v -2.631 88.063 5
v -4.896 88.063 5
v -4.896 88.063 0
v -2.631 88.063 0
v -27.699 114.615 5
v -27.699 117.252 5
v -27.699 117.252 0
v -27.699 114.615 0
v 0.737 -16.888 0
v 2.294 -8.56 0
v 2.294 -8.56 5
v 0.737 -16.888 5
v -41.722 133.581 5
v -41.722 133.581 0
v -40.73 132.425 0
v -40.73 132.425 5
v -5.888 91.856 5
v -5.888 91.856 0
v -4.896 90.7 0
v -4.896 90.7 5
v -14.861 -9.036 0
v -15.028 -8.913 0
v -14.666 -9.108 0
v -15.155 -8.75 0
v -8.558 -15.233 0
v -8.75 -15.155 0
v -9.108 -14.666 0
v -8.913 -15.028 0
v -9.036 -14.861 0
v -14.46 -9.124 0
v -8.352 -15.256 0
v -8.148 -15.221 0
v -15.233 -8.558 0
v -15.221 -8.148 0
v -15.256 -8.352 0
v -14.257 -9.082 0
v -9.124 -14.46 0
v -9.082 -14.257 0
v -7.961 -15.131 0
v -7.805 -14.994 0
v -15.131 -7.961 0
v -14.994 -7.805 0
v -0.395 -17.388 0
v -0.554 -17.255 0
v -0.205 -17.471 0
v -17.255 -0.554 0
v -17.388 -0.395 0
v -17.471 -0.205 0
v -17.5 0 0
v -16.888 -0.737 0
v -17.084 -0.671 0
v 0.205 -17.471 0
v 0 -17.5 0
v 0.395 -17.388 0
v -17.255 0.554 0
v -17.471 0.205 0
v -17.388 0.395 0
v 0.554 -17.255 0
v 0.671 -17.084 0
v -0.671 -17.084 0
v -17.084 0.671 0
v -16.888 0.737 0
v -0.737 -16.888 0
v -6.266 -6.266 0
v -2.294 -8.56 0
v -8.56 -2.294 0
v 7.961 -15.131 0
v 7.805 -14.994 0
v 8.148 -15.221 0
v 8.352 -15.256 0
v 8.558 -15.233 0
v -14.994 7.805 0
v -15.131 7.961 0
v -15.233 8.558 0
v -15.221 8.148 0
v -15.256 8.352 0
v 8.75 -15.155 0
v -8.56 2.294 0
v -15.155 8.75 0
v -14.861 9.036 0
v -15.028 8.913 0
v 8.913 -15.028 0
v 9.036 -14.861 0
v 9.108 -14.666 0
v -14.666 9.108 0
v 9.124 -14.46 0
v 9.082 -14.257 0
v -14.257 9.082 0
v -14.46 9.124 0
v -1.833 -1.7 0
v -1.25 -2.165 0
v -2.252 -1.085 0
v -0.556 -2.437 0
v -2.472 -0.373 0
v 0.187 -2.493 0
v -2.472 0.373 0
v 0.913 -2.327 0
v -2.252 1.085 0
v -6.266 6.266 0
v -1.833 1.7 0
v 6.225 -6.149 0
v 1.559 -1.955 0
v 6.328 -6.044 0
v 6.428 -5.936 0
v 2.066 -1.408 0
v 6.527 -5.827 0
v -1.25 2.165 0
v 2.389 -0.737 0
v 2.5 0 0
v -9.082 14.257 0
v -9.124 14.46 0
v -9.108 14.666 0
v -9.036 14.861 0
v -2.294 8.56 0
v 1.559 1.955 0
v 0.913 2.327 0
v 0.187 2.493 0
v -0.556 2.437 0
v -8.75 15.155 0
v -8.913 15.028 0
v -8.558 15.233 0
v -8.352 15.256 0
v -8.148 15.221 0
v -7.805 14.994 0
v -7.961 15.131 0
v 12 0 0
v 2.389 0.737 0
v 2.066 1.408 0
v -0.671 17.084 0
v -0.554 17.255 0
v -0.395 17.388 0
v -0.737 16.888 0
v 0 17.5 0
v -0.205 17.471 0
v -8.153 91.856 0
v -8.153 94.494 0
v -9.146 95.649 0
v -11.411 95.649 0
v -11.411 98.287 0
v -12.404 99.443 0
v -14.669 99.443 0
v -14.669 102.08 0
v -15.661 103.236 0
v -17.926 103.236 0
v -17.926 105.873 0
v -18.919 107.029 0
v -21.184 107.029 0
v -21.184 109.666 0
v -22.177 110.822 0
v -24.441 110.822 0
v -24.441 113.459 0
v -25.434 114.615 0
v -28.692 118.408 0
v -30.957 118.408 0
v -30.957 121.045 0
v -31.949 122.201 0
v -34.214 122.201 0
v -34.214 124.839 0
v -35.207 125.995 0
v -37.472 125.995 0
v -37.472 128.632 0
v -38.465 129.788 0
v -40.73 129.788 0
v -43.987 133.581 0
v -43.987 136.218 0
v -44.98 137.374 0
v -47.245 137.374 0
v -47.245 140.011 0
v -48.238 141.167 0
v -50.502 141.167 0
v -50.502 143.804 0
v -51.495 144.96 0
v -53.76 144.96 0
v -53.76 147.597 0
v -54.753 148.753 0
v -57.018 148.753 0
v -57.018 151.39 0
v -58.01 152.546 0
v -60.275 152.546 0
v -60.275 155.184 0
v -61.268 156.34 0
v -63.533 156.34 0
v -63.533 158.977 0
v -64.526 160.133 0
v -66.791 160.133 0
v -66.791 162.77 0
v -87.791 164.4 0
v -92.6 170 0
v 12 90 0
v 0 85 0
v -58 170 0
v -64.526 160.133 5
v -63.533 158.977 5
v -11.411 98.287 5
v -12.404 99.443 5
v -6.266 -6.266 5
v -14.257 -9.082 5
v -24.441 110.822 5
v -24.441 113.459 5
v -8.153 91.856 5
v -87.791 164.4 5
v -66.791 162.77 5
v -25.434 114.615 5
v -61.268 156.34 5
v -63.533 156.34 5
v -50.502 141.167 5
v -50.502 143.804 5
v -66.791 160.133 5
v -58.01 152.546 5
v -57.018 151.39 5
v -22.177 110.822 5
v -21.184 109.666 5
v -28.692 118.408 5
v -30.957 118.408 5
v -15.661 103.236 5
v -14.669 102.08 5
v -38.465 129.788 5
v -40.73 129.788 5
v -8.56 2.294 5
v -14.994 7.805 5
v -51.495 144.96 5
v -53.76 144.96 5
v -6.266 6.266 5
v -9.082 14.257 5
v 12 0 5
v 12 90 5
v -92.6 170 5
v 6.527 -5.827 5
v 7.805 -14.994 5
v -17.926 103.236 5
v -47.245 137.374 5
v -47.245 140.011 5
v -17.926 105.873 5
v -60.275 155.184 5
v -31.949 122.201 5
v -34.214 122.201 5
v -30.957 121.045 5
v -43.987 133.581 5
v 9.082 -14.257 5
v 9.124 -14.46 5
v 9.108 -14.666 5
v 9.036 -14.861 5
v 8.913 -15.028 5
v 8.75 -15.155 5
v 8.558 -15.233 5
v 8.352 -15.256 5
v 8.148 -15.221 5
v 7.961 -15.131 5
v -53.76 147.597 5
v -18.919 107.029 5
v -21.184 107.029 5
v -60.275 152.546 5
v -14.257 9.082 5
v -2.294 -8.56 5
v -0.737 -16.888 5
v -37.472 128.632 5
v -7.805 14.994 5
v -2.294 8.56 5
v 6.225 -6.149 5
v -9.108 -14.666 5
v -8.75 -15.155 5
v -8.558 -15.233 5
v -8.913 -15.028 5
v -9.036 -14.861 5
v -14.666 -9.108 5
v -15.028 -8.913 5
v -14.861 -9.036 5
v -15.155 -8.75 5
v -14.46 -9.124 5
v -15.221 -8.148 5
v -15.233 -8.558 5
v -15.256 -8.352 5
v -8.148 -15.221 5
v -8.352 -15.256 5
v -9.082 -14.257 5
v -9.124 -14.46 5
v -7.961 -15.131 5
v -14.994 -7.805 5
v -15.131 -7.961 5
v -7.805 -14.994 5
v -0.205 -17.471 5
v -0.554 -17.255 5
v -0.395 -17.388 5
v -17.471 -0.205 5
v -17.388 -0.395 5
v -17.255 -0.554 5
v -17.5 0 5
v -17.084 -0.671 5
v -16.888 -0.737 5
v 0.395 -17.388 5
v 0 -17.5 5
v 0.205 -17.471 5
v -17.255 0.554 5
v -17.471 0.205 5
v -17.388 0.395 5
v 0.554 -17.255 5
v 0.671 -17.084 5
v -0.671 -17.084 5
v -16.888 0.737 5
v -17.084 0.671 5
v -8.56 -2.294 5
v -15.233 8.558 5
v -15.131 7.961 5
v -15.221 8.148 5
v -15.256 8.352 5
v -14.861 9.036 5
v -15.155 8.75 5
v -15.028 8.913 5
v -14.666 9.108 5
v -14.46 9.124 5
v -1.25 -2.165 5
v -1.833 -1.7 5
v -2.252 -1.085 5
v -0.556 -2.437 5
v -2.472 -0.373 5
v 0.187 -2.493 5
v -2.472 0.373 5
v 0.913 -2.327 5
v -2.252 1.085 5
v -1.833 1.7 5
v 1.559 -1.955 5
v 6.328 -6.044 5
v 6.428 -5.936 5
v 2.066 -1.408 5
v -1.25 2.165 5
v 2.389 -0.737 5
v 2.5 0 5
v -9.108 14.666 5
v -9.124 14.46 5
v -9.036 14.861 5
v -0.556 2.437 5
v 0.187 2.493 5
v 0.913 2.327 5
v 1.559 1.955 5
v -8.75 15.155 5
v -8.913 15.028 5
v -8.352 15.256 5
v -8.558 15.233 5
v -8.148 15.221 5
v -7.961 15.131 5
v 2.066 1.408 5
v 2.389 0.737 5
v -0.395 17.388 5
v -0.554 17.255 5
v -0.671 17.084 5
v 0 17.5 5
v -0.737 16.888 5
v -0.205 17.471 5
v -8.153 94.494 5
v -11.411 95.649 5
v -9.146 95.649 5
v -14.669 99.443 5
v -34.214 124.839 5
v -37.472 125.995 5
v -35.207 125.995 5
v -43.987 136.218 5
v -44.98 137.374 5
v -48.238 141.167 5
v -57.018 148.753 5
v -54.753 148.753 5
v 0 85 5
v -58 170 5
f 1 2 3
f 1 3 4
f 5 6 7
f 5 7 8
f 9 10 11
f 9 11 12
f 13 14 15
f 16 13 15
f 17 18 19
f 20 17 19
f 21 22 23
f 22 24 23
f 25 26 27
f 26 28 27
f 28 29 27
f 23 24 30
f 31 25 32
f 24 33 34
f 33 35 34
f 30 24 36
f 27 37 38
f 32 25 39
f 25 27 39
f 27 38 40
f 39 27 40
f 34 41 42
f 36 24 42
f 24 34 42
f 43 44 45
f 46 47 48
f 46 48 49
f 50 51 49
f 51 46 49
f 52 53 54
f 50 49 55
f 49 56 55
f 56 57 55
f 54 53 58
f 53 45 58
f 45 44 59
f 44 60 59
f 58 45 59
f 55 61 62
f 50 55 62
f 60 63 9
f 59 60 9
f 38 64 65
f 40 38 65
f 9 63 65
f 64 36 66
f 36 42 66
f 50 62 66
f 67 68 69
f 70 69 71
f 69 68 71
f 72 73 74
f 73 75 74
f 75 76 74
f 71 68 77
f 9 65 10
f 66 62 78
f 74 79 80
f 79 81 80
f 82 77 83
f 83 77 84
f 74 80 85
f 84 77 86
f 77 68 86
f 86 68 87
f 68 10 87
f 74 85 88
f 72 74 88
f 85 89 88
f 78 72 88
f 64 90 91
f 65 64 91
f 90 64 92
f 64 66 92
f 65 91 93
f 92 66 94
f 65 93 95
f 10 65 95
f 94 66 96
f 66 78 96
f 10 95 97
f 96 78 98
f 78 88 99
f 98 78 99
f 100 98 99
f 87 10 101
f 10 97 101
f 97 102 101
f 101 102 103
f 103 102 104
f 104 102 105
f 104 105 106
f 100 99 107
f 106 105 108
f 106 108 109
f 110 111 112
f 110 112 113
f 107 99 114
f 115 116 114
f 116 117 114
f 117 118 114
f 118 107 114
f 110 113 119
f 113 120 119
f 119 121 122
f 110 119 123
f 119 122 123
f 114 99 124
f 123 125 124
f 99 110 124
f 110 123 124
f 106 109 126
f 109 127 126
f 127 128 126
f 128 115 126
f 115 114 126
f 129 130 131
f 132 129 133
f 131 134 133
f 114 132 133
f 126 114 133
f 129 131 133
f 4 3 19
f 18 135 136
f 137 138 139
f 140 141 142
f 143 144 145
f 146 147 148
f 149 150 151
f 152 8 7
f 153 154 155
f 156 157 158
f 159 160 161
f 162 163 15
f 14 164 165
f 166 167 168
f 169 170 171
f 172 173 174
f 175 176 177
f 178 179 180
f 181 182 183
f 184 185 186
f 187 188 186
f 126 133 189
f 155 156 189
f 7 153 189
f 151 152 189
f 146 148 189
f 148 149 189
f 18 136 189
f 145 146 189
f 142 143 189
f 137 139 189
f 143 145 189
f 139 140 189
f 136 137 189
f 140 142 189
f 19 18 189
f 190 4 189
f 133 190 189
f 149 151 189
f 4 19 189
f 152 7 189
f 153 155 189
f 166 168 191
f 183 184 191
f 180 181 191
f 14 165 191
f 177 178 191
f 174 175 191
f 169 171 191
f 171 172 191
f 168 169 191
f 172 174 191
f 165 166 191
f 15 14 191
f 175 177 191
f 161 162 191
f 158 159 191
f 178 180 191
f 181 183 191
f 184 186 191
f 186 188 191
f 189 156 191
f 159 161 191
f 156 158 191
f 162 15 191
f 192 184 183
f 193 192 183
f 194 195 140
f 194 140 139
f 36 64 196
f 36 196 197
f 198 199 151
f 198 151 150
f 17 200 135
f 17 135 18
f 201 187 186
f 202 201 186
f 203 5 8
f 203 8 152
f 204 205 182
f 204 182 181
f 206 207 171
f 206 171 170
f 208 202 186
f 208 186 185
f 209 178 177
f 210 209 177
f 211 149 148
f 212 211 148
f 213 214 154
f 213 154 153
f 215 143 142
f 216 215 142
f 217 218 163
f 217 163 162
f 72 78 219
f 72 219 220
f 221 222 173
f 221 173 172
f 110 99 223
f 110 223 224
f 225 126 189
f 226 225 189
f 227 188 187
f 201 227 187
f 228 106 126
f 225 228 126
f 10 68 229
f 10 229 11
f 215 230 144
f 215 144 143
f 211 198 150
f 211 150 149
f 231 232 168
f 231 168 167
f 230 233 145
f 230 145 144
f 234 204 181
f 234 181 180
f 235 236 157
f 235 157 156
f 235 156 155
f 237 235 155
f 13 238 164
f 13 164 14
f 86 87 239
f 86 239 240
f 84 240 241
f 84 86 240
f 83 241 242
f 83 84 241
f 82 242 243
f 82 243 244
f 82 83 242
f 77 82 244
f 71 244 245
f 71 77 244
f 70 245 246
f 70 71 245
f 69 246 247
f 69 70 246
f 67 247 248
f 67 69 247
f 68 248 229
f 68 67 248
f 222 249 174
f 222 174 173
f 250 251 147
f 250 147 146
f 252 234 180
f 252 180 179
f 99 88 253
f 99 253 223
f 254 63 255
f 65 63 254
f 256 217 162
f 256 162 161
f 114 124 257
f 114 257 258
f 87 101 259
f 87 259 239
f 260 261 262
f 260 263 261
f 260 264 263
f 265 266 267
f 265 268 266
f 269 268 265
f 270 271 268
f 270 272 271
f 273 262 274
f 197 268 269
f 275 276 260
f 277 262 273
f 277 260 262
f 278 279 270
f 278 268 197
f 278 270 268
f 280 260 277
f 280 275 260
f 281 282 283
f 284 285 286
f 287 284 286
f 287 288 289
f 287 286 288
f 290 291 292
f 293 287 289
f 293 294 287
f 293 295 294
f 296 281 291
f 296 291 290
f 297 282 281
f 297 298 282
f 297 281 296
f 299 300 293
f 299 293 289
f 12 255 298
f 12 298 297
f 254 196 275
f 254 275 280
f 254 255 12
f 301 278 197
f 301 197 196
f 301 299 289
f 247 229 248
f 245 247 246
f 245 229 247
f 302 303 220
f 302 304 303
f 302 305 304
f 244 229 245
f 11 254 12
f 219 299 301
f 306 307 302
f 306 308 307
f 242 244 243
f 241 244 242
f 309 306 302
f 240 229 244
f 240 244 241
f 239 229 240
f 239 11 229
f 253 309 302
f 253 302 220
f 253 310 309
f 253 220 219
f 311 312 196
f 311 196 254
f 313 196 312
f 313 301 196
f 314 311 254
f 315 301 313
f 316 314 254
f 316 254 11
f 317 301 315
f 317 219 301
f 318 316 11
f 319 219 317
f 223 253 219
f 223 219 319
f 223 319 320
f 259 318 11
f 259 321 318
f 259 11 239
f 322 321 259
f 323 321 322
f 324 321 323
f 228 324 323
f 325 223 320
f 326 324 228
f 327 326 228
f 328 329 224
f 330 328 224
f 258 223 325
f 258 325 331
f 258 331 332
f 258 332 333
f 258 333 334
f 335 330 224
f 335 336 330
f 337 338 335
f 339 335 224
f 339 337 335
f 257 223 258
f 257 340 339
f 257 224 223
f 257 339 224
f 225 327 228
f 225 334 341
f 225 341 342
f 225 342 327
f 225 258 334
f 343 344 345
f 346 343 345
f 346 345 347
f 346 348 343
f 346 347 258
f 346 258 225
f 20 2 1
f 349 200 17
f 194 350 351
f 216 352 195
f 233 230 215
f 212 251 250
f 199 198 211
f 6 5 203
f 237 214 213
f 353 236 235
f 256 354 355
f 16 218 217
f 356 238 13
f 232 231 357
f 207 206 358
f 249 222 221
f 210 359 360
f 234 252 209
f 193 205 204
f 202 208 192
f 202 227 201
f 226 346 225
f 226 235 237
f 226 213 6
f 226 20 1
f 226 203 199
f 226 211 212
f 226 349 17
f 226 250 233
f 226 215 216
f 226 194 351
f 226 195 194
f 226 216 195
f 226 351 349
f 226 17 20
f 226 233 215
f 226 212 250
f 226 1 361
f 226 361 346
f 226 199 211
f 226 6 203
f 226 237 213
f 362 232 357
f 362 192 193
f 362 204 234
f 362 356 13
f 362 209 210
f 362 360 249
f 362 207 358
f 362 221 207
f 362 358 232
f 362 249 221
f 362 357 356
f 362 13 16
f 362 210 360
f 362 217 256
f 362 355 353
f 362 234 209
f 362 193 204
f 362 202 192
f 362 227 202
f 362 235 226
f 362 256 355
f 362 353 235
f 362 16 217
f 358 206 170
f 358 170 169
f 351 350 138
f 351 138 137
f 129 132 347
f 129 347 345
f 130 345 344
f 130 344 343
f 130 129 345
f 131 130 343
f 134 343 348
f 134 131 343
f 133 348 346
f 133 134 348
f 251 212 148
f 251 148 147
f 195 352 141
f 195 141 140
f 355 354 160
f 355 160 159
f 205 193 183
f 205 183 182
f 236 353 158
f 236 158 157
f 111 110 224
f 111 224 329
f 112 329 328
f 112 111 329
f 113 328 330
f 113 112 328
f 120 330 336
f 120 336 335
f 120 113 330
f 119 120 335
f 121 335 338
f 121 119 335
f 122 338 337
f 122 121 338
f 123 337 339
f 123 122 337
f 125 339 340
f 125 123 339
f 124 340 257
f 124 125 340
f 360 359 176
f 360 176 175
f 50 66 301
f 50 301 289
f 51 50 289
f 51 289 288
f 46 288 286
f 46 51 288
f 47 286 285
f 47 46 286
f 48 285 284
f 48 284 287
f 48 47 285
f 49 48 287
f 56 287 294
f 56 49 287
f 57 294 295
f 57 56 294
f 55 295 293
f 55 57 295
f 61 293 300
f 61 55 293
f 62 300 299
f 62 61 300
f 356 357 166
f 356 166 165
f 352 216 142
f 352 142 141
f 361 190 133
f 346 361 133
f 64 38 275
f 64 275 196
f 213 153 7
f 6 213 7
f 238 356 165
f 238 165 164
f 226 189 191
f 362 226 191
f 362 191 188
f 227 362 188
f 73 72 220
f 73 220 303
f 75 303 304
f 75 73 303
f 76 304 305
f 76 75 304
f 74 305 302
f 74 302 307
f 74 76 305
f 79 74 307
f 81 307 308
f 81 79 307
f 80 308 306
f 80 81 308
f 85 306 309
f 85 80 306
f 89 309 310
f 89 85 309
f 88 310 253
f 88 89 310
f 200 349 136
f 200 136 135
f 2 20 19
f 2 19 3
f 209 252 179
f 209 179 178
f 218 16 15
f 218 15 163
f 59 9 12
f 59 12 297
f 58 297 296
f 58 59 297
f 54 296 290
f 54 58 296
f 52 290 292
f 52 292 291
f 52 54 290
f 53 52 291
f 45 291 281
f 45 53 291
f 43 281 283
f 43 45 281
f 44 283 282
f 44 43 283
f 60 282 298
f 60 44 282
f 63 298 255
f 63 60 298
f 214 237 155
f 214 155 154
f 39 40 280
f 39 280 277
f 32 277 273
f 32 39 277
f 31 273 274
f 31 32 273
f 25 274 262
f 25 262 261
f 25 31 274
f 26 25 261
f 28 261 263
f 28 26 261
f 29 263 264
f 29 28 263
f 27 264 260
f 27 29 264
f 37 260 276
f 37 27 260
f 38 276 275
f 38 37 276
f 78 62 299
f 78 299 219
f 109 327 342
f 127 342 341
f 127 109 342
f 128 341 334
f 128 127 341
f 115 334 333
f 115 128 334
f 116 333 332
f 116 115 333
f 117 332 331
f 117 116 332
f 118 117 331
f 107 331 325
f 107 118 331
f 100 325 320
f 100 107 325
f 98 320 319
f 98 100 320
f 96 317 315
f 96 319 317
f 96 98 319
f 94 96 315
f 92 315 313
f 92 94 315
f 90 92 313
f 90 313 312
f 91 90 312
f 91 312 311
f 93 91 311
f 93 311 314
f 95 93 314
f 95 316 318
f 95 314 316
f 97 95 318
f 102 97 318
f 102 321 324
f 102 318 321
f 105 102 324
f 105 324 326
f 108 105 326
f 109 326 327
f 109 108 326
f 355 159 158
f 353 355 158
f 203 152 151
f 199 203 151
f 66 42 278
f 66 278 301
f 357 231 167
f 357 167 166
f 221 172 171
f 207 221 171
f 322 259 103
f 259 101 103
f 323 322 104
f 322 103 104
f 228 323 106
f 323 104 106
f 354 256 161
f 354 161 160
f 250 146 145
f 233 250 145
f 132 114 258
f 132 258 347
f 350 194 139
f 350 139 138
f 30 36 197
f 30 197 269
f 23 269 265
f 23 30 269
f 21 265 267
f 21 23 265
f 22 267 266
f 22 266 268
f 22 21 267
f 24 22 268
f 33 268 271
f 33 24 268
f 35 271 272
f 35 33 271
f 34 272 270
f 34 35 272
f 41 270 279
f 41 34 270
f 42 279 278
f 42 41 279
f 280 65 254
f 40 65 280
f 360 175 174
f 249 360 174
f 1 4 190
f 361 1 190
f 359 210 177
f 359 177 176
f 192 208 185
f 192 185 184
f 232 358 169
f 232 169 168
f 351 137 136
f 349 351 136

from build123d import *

# Parameters (mm, degrees)
SKETCH2_R           = 8.75
BOSS_EXTRUDE1_DEPTH = 5
SKETCH2_3_R         = 2.5
CUT_EXTRUDE1_DEPTH  = 31
BOSS_EXTRUDE2_DEPTH = 5
CIRPATTERN2_COUNT   = 8
CIRPATTERN2_ANGLE   = 210
BOSS_EXTRUDE3_DEPTH = 5
BOSS_EXTRUDE4_START = -5
BOSS_EXTRUDE4_DEPTH = 5
CUT_EXTRUDE2_START  = -5
SKETCH7_R           = 2.5
CUT_EXTRUDE2_DEPTH  = 5
BOSS_EXTRUDE5_DEPTH = 5
LPATTERN1_COUNT     = 20
LPATTERN1_PITCH     = 5


with BuildPart() as part:
    # Sketch2 → Boss-Extrude1 (new body)
    with BuildSketch(Plane.XY):
        Circle(SKETCH2_R)
    extrude(amount=BOSS_EXTRUDE1_DEPTH)

    # Sketch2<3> → Cut-Extrude1 (cut)
    with BuildSketch(Plane.XY):
        Circle(SKETCH2_3_R)
    extrude(amount=CUT_EXTRUDE1_DEPTH, mode=Mode.SUBTRACT)

    # Sketch2<4> → Boss-Extrude2 (add)
    with BuildSketch(Plane.XY):
        with BuildLine():
            Line((0, 7.99133798), (-2.4, 7.99133798))
            Line((-2.4, 7.99133798), (-0.737233852, 16.887790594))
            ThreePointArc((-0.737233852, 16.887790594), (0, 17.5), (0.737233852, 16.887790594))
            Line((0.737233852, 16.887790594), (2.4, 7.99133798))
            Line((2.4, 7.99133798), (0, 7.99133798))
        make_face()
    boss_extrude2 = extrude(amount=BOSS_EXTRUDE2_DEPTH)

    # CirPattern2: Boss-Extrude2 ×8 about axis
    cirpattern2_axis = Axis((0, 0, 5), (0, 0, 1))
    for i in range(1, CIRPATTERN2_COUNT):
        add(boss_extrude2.rotate(cirpattern2_axis, i * CIRPATTERN2_ANGLE / (CIRPATTERN2_COUNT - 1)))



with BuildPart() as body_2:
    # Sketch5 → Boss-Extrude3 (new body)
    with BuildSketch(Plane.XY):
        Polygon((12, 85), (12, 90), (-58, 170), (-73, 170), (-92.6, 170), (-87.790588235, 164.4), (-66.790588235, 162.769863014), (0, 85), (0, 0), (12, 0), align=None)
    extrude(amount=BOSS_EXTRUDE3_DEPTH)


with BuildPart() as part_1:
    add(part.part)

    add(body_2.part)  # Boss-Extrude4 merges body 2
    # Sketch6 → Boss-Extrude4 (add)
    with BuildSketch(Plane.XY.offset(5).offset(BOSS_EXTRUDE4_START)):
        with BuildLine():
            ThreePointArc((8.75, 0), (8.175439475, -3.118443425), (6.527213853, -5.827347537))
            Line((6.527213853, -5.827347537), (12, 0))
            Line((12, 0), (8.75, 0))
        make_face()
    extrude(amount=BOSS_EXTRUDE4_DEPTH)

    # Sketch7 → Cut-Extrude2 (cut)
    with BuildSketch(Plane.XY.offset(5).offset(CUT_EXTRUDE2_START)):
        Circle(SKETCH7_R)
    extrude(amount=CUT_EXTRUDE2_DEPTH, mode=Mode.SUBTRACT)

    # Sketch8 → Boss-Extrude5 (add)
    with BuildSketch(Plane.XY.offset(5)):
        Polygon((-66.790588235, 162.769863014), (-66.790588235, 160.132718073), (-64.525746109, 160.132718073), align=None)
    boss_extrude5 = extrude(amount=-BOSS_EXTRUDE5_DEPTH)

    # LPattern1: Boss-Extrude5 ×20
    with Locations(*[Vector(0.651526069725242, -0.7586262455704912, 0) * (i * LPATTERN1_PITCH) for i in range(1, LPATTERN1_COUNT)]):
        add(boss_extrude5)


solid = part_1.part
